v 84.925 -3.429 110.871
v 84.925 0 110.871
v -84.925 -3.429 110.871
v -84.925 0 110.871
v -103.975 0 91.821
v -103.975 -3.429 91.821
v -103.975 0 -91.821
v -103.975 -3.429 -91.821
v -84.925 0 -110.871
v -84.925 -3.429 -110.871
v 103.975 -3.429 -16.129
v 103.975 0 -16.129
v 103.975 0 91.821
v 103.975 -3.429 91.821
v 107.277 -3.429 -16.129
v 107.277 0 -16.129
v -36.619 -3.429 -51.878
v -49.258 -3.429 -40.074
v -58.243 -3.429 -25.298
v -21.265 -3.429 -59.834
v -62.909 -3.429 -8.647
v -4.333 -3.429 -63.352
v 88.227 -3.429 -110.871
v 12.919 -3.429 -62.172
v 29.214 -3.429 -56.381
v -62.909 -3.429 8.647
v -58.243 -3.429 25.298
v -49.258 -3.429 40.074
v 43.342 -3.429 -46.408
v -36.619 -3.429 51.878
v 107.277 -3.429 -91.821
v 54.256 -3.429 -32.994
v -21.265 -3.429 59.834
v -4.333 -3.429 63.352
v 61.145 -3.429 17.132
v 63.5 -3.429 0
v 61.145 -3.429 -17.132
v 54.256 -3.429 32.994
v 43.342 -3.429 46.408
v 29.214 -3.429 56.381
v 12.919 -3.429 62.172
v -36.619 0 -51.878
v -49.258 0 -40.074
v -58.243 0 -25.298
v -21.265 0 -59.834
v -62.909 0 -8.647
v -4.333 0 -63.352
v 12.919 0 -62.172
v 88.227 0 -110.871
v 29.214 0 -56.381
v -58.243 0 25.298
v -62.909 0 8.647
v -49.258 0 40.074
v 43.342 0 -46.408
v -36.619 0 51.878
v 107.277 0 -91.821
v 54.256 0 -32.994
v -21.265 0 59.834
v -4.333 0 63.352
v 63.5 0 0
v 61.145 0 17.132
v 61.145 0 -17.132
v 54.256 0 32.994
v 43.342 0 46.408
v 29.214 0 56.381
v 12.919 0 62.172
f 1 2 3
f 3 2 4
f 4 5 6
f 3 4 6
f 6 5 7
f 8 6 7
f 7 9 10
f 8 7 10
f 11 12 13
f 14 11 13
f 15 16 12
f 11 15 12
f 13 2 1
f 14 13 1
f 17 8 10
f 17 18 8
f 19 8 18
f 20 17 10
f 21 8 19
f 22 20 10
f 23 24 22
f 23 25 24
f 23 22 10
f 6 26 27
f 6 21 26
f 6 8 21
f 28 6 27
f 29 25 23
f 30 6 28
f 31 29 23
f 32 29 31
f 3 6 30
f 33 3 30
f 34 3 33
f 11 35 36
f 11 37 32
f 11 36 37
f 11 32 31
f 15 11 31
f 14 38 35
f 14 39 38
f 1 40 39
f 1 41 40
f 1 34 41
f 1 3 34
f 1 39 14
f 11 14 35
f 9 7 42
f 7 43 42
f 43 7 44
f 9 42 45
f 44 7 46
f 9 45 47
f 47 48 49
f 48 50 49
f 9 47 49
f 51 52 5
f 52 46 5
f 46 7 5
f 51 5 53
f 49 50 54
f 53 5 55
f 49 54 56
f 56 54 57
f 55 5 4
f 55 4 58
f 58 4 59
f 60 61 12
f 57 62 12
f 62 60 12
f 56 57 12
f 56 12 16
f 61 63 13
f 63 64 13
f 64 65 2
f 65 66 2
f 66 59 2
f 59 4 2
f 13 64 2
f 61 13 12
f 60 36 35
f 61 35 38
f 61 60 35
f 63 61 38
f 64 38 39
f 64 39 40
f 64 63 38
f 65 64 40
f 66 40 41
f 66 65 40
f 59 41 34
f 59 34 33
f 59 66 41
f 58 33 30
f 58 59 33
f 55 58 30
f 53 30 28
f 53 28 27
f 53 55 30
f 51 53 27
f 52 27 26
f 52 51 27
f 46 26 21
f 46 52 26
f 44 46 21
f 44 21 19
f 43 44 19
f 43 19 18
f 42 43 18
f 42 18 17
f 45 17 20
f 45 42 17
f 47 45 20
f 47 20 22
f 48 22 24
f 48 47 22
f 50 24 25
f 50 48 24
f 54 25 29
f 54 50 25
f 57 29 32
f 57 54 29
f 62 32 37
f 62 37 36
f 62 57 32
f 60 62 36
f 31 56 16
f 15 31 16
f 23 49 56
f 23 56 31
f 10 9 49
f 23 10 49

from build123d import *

# Parameters (mm, degrees)
F0_R     = 63.5
F1_DEPTH = 3.429
F2_SIZE  = 19.05


with BuildPart() as f1:
    # F0 (on Front) → F1 (new body)
    with BuildSketch(Plane.XZ):
        Polygon((103.9749, -16.129), (103.9749, 110.871), (-103.9749, 110.871), (-103.9749, -110.871), (107.2769, -110.871), (107.2769, -16.129), align=None)
        Circle(F0_R, mode=Mode.SUBTRACT)
    extrude(amount=F1_DEPTH)

    # F2
    f2_edges = [f1.edges().sort_by_distance(p)[0] for p in [
        (-103.9749, -1.7145, 110.871),
        (103.9749, -1.7145, 110.871),
        (107.2769, -1.7145, -110.871),
        (-103.9749, -1.7145, -110.871),
    ]]
    chamfer(f2_edges, length=F2_SIZE)


solid = f1.part
